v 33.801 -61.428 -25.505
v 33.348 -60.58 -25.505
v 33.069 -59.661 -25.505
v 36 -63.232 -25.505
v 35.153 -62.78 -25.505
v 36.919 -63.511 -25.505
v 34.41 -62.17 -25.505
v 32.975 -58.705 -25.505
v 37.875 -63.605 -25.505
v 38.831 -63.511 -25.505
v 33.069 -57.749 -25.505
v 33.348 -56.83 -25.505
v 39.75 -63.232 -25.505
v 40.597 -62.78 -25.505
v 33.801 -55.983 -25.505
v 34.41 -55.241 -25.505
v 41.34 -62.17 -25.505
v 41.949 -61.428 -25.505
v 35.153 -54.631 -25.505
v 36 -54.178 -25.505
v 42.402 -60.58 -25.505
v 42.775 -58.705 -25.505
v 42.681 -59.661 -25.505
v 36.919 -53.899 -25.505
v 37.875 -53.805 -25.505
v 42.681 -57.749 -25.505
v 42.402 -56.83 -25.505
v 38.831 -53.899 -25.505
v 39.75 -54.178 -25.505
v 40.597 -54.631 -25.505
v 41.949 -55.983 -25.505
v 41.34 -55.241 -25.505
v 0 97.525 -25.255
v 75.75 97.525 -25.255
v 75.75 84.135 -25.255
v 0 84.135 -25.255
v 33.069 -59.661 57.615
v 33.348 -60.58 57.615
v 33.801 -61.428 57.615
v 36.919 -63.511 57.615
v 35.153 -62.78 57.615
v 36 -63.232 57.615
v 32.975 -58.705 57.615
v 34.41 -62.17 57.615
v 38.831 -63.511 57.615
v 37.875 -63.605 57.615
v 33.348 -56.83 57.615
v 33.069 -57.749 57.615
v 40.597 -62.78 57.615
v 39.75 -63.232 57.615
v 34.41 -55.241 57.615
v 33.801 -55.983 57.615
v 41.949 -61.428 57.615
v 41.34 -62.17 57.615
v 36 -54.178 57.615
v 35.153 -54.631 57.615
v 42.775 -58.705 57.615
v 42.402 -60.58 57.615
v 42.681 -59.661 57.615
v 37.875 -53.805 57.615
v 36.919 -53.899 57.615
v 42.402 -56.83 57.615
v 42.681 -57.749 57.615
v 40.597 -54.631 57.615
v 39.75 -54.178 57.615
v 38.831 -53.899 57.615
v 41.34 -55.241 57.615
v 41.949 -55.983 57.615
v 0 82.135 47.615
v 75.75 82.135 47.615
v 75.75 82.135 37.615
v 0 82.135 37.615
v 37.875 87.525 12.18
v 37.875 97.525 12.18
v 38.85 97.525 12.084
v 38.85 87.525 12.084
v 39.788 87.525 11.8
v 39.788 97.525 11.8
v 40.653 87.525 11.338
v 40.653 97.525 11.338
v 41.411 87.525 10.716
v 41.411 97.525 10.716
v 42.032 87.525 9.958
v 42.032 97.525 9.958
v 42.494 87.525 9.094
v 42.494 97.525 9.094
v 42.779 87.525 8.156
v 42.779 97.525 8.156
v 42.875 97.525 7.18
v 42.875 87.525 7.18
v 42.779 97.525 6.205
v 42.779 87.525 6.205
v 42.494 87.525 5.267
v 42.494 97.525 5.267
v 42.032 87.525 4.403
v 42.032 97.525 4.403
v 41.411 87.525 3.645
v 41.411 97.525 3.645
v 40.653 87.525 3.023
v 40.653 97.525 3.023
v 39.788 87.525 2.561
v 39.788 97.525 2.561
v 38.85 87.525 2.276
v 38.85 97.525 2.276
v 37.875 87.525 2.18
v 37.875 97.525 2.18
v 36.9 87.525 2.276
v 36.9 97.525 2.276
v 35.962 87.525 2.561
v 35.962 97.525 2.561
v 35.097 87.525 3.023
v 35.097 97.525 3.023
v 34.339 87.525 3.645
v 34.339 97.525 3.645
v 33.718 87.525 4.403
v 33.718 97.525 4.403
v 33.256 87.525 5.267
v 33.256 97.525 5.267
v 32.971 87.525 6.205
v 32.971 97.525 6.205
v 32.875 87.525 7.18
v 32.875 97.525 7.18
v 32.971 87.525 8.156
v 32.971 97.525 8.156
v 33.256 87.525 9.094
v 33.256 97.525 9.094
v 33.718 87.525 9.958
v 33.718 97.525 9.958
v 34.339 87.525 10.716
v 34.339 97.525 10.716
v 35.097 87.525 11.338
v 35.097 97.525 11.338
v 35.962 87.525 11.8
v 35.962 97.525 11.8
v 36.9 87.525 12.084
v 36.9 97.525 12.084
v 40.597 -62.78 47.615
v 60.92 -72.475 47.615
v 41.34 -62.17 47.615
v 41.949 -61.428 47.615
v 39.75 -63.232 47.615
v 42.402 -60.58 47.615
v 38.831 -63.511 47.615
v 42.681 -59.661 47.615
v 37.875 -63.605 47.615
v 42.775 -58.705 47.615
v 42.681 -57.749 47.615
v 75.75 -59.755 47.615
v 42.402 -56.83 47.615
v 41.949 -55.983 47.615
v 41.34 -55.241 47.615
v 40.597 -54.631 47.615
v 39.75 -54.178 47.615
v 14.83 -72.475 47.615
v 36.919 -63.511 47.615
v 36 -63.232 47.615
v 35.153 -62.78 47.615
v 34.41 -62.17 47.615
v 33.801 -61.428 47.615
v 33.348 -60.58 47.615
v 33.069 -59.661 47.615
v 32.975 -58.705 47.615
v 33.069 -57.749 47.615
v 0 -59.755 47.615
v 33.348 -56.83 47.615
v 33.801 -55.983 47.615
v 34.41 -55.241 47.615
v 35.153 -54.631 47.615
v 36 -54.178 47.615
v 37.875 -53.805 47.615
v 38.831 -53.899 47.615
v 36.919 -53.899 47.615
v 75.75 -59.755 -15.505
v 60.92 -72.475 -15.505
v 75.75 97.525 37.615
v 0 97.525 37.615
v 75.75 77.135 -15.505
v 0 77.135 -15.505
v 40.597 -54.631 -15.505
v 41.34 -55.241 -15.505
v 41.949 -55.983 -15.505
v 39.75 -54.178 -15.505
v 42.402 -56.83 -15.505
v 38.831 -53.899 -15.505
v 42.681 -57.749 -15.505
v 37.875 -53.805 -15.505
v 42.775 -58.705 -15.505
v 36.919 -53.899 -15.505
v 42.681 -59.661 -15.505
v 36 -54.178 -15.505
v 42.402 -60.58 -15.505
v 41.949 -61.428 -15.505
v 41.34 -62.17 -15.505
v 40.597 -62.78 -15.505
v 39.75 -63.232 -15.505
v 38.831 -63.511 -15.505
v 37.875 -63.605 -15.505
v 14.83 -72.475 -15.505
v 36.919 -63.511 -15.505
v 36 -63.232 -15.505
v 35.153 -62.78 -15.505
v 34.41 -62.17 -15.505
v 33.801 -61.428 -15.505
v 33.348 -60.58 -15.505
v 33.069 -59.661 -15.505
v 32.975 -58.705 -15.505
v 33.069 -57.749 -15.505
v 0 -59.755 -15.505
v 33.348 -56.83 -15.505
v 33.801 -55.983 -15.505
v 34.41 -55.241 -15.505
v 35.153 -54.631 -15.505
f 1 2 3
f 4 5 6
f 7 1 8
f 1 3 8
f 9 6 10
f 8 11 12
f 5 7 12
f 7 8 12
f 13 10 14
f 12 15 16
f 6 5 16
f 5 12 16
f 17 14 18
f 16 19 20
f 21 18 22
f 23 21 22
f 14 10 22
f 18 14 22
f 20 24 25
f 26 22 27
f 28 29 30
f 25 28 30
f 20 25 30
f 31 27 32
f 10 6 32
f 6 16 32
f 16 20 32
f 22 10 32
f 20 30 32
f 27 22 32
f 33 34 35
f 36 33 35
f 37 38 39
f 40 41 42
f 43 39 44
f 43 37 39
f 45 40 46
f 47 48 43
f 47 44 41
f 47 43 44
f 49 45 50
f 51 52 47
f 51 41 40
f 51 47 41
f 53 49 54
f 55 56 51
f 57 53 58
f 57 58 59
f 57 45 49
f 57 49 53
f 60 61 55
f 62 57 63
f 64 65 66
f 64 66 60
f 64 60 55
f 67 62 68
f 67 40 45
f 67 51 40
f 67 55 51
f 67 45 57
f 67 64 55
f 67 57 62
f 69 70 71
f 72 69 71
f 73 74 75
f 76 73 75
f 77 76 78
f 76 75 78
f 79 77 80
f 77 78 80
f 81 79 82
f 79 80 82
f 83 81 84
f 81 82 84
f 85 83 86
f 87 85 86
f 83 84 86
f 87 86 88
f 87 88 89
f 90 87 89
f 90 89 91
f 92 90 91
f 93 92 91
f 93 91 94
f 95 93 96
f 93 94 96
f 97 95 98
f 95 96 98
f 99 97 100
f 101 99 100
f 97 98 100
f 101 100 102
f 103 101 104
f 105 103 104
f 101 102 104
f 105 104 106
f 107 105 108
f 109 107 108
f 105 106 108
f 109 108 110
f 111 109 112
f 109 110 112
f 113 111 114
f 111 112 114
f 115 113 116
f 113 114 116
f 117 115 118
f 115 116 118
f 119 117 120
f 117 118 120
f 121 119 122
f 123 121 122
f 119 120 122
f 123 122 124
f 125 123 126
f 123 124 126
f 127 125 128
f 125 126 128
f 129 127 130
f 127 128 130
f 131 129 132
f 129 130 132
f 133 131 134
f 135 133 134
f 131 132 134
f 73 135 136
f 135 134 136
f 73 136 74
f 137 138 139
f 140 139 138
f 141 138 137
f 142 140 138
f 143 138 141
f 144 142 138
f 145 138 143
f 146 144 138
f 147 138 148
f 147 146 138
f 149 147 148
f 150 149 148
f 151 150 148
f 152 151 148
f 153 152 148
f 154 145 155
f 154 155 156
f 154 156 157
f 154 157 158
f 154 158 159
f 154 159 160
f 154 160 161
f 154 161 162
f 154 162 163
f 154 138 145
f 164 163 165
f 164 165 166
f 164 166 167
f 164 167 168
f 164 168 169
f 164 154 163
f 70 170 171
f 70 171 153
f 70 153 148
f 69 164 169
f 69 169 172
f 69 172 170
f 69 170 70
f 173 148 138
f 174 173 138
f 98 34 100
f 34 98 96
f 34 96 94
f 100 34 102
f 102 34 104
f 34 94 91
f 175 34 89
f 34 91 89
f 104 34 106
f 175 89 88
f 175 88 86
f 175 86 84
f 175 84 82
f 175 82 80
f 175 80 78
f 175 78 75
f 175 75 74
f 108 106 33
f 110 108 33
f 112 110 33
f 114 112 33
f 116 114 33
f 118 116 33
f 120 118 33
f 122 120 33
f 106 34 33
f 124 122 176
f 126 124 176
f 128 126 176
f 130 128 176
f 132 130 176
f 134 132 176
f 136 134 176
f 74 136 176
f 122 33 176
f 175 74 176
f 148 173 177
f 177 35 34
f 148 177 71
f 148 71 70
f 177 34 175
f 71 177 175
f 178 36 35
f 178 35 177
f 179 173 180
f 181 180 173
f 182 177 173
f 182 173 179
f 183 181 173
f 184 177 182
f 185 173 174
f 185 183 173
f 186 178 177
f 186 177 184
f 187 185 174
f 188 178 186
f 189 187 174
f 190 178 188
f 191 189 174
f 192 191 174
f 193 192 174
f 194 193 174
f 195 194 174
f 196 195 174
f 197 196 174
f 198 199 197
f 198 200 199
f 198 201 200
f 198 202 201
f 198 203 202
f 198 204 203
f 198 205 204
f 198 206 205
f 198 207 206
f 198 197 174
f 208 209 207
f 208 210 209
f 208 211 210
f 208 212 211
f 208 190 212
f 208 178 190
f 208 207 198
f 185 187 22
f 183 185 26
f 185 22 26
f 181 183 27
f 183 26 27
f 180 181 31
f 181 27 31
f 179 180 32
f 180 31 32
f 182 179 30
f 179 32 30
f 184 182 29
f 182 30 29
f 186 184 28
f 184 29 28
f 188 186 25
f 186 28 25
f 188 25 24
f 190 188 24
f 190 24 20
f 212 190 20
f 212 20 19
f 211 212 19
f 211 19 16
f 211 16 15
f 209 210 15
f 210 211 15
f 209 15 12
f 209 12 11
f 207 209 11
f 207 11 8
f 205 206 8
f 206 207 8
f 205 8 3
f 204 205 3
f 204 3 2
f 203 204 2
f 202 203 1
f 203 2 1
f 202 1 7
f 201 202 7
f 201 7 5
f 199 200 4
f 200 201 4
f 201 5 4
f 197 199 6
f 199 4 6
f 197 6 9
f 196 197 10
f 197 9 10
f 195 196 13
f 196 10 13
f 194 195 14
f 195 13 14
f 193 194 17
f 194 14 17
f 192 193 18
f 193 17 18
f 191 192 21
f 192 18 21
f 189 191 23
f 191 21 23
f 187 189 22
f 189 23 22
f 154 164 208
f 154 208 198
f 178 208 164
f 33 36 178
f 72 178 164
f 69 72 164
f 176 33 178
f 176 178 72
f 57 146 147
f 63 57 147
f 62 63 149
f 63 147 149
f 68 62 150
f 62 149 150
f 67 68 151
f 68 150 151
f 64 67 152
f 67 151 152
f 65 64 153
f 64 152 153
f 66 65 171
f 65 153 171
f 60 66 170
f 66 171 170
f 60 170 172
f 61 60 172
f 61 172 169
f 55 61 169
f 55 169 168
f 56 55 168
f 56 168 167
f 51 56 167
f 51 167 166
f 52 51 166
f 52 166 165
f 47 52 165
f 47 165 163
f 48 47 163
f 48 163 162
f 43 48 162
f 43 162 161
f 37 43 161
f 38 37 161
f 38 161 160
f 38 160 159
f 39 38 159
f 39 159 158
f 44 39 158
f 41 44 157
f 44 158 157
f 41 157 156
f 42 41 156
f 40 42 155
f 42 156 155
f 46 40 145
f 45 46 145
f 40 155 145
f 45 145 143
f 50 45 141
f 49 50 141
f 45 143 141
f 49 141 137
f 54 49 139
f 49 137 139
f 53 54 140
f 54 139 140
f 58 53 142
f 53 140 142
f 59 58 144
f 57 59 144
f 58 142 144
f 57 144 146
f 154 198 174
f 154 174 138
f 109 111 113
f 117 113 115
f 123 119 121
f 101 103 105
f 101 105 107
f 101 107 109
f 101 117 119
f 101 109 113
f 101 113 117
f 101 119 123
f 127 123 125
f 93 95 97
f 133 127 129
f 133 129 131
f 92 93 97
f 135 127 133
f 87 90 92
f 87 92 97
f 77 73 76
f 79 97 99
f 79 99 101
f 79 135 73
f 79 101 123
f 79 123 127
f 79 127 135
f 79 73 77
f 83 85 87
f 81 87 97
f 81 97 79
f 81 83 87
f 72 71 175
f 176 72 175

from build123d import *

# Parameters (mm, degrees)
BOSS_EXTRUDE1_DEPTH      = 75.75
CUT_EXTRUDE1_DEPTH       = 144.384624803
BOSS_EXTRUDE2_DEPTH      = 10
BOSS_EXTRUDE2_DEPTH_BACK = 73.12
SKETCH3_R                = 4.9
SKETCH4_R                = 5
CUT_EXTRUDE2_DEPTH       = 10
SKETCH5_W                = 2
SKETCH5_H                = 13.39
CUT_EXTRUDE3_DEPTH       = 137.266849467
SKETCH6_W                = 10
SKETCH6_H                = 2
CUT_EXTRUDE4_DEPTH       = 137.266849467


with BuildPart() as part:
    # Sketch1 → Boss-Extrude1 (new body)
    with BuildSketch(Plane(origin=(0, 0, 0), x_dir=(0, 0, -1), z_dir=(1, 0, 0))):
        Polygon((-39.615373705, 97.524665991), (15.504626295, 97.524665991), (25.254562849, 97.524665991), (25.254562849, 84.134665991), (15.504626295, 77.134665991), (15.504626295, -72.475334009), (-47.615373705, -72.475334009), (-47.615373705, 84.134665991), (-39.615373705, 84.134665991), align=None)
    extrude(amount=BOSS_EXTRUDE1_DEPTH)

    # Sketch2 → Cut-Extrude1 (cut, through all)
    with BuildSketch(Plane.XY.offset(47.615373705)):
        Polygon((0, -59.755334009), (14.83, -72.475334009), (0, -72.475334009), align=None)
        Polygon((75.75, -59.755334009), (60.92, -72.475334009), (75.75, -72.475334009), align=None)
    extrude(amount=-CUT_EXTRUDE1_DEPTH, mode=Mode.SUBTRACT)

    # Sketch3 → Boss-Extrude2 (add, two sides: drawn at the far end of the back side and taken through both)
    with BuildSketch(Plane.XY.offset(47.615373705).offset(-BOSS_EXTRUDE2_DEPTH_BACK)):
        with Locations((37.875, -58.705334009)):
            Circle(SKETCH3_R)
    extrude(amount=BOSS_EXTRUDE2_DEPTH + BOSS_EXTRUDE2_DEPTH_BACK)

    # Sketch4 → Cut-Extrude2 (cut)
    with BuildSketch(Plane(origin=(0, 97.524665991, 0), x_dir=(1, 0, 0), z_dir=(0, 1, 0))):
        with Locations(Location((37.875, -7.180405428, 0), (0, 0, 270))):
            Circle(SKETCH4_R)
    extrude(amount=-CUT_EXTRUDE2_DEPTH, mode=Mode.SUBTRACT)

    # Sketch5 → Cut-Extrude3 (cut, through all)
    with BuildSketch(Plane(origin=(75.75, 0, 0), x_dir=(0, 0, -1), z_dir=(1, 0, 0))):
        with Locations((-38.615373705, 90.829665991)):
            Rectangle(SKETCH5_W, SKETCH5_H)
    extrude(amount=-CUT_EXTRUDE3_DEPTH, mode=Mode.SUBTRACT)

    # Sketch6 → Cut-Extrude4 (cut, through all)
    with BuildSketch(Plane(origin=(75.75, 0, 0), x_dir=(0, 0, -1), z_dir=(1, 0, 0))):
        with Locations((-42.615373705, 83.134665991)):
            Rectangle(SKETCH6_W, SKETCH6_H)
    extrude(amount=-CUT_EXTRUDE4_DEPTH, mode=Mode.SUBTRACT)


solid = part.part
